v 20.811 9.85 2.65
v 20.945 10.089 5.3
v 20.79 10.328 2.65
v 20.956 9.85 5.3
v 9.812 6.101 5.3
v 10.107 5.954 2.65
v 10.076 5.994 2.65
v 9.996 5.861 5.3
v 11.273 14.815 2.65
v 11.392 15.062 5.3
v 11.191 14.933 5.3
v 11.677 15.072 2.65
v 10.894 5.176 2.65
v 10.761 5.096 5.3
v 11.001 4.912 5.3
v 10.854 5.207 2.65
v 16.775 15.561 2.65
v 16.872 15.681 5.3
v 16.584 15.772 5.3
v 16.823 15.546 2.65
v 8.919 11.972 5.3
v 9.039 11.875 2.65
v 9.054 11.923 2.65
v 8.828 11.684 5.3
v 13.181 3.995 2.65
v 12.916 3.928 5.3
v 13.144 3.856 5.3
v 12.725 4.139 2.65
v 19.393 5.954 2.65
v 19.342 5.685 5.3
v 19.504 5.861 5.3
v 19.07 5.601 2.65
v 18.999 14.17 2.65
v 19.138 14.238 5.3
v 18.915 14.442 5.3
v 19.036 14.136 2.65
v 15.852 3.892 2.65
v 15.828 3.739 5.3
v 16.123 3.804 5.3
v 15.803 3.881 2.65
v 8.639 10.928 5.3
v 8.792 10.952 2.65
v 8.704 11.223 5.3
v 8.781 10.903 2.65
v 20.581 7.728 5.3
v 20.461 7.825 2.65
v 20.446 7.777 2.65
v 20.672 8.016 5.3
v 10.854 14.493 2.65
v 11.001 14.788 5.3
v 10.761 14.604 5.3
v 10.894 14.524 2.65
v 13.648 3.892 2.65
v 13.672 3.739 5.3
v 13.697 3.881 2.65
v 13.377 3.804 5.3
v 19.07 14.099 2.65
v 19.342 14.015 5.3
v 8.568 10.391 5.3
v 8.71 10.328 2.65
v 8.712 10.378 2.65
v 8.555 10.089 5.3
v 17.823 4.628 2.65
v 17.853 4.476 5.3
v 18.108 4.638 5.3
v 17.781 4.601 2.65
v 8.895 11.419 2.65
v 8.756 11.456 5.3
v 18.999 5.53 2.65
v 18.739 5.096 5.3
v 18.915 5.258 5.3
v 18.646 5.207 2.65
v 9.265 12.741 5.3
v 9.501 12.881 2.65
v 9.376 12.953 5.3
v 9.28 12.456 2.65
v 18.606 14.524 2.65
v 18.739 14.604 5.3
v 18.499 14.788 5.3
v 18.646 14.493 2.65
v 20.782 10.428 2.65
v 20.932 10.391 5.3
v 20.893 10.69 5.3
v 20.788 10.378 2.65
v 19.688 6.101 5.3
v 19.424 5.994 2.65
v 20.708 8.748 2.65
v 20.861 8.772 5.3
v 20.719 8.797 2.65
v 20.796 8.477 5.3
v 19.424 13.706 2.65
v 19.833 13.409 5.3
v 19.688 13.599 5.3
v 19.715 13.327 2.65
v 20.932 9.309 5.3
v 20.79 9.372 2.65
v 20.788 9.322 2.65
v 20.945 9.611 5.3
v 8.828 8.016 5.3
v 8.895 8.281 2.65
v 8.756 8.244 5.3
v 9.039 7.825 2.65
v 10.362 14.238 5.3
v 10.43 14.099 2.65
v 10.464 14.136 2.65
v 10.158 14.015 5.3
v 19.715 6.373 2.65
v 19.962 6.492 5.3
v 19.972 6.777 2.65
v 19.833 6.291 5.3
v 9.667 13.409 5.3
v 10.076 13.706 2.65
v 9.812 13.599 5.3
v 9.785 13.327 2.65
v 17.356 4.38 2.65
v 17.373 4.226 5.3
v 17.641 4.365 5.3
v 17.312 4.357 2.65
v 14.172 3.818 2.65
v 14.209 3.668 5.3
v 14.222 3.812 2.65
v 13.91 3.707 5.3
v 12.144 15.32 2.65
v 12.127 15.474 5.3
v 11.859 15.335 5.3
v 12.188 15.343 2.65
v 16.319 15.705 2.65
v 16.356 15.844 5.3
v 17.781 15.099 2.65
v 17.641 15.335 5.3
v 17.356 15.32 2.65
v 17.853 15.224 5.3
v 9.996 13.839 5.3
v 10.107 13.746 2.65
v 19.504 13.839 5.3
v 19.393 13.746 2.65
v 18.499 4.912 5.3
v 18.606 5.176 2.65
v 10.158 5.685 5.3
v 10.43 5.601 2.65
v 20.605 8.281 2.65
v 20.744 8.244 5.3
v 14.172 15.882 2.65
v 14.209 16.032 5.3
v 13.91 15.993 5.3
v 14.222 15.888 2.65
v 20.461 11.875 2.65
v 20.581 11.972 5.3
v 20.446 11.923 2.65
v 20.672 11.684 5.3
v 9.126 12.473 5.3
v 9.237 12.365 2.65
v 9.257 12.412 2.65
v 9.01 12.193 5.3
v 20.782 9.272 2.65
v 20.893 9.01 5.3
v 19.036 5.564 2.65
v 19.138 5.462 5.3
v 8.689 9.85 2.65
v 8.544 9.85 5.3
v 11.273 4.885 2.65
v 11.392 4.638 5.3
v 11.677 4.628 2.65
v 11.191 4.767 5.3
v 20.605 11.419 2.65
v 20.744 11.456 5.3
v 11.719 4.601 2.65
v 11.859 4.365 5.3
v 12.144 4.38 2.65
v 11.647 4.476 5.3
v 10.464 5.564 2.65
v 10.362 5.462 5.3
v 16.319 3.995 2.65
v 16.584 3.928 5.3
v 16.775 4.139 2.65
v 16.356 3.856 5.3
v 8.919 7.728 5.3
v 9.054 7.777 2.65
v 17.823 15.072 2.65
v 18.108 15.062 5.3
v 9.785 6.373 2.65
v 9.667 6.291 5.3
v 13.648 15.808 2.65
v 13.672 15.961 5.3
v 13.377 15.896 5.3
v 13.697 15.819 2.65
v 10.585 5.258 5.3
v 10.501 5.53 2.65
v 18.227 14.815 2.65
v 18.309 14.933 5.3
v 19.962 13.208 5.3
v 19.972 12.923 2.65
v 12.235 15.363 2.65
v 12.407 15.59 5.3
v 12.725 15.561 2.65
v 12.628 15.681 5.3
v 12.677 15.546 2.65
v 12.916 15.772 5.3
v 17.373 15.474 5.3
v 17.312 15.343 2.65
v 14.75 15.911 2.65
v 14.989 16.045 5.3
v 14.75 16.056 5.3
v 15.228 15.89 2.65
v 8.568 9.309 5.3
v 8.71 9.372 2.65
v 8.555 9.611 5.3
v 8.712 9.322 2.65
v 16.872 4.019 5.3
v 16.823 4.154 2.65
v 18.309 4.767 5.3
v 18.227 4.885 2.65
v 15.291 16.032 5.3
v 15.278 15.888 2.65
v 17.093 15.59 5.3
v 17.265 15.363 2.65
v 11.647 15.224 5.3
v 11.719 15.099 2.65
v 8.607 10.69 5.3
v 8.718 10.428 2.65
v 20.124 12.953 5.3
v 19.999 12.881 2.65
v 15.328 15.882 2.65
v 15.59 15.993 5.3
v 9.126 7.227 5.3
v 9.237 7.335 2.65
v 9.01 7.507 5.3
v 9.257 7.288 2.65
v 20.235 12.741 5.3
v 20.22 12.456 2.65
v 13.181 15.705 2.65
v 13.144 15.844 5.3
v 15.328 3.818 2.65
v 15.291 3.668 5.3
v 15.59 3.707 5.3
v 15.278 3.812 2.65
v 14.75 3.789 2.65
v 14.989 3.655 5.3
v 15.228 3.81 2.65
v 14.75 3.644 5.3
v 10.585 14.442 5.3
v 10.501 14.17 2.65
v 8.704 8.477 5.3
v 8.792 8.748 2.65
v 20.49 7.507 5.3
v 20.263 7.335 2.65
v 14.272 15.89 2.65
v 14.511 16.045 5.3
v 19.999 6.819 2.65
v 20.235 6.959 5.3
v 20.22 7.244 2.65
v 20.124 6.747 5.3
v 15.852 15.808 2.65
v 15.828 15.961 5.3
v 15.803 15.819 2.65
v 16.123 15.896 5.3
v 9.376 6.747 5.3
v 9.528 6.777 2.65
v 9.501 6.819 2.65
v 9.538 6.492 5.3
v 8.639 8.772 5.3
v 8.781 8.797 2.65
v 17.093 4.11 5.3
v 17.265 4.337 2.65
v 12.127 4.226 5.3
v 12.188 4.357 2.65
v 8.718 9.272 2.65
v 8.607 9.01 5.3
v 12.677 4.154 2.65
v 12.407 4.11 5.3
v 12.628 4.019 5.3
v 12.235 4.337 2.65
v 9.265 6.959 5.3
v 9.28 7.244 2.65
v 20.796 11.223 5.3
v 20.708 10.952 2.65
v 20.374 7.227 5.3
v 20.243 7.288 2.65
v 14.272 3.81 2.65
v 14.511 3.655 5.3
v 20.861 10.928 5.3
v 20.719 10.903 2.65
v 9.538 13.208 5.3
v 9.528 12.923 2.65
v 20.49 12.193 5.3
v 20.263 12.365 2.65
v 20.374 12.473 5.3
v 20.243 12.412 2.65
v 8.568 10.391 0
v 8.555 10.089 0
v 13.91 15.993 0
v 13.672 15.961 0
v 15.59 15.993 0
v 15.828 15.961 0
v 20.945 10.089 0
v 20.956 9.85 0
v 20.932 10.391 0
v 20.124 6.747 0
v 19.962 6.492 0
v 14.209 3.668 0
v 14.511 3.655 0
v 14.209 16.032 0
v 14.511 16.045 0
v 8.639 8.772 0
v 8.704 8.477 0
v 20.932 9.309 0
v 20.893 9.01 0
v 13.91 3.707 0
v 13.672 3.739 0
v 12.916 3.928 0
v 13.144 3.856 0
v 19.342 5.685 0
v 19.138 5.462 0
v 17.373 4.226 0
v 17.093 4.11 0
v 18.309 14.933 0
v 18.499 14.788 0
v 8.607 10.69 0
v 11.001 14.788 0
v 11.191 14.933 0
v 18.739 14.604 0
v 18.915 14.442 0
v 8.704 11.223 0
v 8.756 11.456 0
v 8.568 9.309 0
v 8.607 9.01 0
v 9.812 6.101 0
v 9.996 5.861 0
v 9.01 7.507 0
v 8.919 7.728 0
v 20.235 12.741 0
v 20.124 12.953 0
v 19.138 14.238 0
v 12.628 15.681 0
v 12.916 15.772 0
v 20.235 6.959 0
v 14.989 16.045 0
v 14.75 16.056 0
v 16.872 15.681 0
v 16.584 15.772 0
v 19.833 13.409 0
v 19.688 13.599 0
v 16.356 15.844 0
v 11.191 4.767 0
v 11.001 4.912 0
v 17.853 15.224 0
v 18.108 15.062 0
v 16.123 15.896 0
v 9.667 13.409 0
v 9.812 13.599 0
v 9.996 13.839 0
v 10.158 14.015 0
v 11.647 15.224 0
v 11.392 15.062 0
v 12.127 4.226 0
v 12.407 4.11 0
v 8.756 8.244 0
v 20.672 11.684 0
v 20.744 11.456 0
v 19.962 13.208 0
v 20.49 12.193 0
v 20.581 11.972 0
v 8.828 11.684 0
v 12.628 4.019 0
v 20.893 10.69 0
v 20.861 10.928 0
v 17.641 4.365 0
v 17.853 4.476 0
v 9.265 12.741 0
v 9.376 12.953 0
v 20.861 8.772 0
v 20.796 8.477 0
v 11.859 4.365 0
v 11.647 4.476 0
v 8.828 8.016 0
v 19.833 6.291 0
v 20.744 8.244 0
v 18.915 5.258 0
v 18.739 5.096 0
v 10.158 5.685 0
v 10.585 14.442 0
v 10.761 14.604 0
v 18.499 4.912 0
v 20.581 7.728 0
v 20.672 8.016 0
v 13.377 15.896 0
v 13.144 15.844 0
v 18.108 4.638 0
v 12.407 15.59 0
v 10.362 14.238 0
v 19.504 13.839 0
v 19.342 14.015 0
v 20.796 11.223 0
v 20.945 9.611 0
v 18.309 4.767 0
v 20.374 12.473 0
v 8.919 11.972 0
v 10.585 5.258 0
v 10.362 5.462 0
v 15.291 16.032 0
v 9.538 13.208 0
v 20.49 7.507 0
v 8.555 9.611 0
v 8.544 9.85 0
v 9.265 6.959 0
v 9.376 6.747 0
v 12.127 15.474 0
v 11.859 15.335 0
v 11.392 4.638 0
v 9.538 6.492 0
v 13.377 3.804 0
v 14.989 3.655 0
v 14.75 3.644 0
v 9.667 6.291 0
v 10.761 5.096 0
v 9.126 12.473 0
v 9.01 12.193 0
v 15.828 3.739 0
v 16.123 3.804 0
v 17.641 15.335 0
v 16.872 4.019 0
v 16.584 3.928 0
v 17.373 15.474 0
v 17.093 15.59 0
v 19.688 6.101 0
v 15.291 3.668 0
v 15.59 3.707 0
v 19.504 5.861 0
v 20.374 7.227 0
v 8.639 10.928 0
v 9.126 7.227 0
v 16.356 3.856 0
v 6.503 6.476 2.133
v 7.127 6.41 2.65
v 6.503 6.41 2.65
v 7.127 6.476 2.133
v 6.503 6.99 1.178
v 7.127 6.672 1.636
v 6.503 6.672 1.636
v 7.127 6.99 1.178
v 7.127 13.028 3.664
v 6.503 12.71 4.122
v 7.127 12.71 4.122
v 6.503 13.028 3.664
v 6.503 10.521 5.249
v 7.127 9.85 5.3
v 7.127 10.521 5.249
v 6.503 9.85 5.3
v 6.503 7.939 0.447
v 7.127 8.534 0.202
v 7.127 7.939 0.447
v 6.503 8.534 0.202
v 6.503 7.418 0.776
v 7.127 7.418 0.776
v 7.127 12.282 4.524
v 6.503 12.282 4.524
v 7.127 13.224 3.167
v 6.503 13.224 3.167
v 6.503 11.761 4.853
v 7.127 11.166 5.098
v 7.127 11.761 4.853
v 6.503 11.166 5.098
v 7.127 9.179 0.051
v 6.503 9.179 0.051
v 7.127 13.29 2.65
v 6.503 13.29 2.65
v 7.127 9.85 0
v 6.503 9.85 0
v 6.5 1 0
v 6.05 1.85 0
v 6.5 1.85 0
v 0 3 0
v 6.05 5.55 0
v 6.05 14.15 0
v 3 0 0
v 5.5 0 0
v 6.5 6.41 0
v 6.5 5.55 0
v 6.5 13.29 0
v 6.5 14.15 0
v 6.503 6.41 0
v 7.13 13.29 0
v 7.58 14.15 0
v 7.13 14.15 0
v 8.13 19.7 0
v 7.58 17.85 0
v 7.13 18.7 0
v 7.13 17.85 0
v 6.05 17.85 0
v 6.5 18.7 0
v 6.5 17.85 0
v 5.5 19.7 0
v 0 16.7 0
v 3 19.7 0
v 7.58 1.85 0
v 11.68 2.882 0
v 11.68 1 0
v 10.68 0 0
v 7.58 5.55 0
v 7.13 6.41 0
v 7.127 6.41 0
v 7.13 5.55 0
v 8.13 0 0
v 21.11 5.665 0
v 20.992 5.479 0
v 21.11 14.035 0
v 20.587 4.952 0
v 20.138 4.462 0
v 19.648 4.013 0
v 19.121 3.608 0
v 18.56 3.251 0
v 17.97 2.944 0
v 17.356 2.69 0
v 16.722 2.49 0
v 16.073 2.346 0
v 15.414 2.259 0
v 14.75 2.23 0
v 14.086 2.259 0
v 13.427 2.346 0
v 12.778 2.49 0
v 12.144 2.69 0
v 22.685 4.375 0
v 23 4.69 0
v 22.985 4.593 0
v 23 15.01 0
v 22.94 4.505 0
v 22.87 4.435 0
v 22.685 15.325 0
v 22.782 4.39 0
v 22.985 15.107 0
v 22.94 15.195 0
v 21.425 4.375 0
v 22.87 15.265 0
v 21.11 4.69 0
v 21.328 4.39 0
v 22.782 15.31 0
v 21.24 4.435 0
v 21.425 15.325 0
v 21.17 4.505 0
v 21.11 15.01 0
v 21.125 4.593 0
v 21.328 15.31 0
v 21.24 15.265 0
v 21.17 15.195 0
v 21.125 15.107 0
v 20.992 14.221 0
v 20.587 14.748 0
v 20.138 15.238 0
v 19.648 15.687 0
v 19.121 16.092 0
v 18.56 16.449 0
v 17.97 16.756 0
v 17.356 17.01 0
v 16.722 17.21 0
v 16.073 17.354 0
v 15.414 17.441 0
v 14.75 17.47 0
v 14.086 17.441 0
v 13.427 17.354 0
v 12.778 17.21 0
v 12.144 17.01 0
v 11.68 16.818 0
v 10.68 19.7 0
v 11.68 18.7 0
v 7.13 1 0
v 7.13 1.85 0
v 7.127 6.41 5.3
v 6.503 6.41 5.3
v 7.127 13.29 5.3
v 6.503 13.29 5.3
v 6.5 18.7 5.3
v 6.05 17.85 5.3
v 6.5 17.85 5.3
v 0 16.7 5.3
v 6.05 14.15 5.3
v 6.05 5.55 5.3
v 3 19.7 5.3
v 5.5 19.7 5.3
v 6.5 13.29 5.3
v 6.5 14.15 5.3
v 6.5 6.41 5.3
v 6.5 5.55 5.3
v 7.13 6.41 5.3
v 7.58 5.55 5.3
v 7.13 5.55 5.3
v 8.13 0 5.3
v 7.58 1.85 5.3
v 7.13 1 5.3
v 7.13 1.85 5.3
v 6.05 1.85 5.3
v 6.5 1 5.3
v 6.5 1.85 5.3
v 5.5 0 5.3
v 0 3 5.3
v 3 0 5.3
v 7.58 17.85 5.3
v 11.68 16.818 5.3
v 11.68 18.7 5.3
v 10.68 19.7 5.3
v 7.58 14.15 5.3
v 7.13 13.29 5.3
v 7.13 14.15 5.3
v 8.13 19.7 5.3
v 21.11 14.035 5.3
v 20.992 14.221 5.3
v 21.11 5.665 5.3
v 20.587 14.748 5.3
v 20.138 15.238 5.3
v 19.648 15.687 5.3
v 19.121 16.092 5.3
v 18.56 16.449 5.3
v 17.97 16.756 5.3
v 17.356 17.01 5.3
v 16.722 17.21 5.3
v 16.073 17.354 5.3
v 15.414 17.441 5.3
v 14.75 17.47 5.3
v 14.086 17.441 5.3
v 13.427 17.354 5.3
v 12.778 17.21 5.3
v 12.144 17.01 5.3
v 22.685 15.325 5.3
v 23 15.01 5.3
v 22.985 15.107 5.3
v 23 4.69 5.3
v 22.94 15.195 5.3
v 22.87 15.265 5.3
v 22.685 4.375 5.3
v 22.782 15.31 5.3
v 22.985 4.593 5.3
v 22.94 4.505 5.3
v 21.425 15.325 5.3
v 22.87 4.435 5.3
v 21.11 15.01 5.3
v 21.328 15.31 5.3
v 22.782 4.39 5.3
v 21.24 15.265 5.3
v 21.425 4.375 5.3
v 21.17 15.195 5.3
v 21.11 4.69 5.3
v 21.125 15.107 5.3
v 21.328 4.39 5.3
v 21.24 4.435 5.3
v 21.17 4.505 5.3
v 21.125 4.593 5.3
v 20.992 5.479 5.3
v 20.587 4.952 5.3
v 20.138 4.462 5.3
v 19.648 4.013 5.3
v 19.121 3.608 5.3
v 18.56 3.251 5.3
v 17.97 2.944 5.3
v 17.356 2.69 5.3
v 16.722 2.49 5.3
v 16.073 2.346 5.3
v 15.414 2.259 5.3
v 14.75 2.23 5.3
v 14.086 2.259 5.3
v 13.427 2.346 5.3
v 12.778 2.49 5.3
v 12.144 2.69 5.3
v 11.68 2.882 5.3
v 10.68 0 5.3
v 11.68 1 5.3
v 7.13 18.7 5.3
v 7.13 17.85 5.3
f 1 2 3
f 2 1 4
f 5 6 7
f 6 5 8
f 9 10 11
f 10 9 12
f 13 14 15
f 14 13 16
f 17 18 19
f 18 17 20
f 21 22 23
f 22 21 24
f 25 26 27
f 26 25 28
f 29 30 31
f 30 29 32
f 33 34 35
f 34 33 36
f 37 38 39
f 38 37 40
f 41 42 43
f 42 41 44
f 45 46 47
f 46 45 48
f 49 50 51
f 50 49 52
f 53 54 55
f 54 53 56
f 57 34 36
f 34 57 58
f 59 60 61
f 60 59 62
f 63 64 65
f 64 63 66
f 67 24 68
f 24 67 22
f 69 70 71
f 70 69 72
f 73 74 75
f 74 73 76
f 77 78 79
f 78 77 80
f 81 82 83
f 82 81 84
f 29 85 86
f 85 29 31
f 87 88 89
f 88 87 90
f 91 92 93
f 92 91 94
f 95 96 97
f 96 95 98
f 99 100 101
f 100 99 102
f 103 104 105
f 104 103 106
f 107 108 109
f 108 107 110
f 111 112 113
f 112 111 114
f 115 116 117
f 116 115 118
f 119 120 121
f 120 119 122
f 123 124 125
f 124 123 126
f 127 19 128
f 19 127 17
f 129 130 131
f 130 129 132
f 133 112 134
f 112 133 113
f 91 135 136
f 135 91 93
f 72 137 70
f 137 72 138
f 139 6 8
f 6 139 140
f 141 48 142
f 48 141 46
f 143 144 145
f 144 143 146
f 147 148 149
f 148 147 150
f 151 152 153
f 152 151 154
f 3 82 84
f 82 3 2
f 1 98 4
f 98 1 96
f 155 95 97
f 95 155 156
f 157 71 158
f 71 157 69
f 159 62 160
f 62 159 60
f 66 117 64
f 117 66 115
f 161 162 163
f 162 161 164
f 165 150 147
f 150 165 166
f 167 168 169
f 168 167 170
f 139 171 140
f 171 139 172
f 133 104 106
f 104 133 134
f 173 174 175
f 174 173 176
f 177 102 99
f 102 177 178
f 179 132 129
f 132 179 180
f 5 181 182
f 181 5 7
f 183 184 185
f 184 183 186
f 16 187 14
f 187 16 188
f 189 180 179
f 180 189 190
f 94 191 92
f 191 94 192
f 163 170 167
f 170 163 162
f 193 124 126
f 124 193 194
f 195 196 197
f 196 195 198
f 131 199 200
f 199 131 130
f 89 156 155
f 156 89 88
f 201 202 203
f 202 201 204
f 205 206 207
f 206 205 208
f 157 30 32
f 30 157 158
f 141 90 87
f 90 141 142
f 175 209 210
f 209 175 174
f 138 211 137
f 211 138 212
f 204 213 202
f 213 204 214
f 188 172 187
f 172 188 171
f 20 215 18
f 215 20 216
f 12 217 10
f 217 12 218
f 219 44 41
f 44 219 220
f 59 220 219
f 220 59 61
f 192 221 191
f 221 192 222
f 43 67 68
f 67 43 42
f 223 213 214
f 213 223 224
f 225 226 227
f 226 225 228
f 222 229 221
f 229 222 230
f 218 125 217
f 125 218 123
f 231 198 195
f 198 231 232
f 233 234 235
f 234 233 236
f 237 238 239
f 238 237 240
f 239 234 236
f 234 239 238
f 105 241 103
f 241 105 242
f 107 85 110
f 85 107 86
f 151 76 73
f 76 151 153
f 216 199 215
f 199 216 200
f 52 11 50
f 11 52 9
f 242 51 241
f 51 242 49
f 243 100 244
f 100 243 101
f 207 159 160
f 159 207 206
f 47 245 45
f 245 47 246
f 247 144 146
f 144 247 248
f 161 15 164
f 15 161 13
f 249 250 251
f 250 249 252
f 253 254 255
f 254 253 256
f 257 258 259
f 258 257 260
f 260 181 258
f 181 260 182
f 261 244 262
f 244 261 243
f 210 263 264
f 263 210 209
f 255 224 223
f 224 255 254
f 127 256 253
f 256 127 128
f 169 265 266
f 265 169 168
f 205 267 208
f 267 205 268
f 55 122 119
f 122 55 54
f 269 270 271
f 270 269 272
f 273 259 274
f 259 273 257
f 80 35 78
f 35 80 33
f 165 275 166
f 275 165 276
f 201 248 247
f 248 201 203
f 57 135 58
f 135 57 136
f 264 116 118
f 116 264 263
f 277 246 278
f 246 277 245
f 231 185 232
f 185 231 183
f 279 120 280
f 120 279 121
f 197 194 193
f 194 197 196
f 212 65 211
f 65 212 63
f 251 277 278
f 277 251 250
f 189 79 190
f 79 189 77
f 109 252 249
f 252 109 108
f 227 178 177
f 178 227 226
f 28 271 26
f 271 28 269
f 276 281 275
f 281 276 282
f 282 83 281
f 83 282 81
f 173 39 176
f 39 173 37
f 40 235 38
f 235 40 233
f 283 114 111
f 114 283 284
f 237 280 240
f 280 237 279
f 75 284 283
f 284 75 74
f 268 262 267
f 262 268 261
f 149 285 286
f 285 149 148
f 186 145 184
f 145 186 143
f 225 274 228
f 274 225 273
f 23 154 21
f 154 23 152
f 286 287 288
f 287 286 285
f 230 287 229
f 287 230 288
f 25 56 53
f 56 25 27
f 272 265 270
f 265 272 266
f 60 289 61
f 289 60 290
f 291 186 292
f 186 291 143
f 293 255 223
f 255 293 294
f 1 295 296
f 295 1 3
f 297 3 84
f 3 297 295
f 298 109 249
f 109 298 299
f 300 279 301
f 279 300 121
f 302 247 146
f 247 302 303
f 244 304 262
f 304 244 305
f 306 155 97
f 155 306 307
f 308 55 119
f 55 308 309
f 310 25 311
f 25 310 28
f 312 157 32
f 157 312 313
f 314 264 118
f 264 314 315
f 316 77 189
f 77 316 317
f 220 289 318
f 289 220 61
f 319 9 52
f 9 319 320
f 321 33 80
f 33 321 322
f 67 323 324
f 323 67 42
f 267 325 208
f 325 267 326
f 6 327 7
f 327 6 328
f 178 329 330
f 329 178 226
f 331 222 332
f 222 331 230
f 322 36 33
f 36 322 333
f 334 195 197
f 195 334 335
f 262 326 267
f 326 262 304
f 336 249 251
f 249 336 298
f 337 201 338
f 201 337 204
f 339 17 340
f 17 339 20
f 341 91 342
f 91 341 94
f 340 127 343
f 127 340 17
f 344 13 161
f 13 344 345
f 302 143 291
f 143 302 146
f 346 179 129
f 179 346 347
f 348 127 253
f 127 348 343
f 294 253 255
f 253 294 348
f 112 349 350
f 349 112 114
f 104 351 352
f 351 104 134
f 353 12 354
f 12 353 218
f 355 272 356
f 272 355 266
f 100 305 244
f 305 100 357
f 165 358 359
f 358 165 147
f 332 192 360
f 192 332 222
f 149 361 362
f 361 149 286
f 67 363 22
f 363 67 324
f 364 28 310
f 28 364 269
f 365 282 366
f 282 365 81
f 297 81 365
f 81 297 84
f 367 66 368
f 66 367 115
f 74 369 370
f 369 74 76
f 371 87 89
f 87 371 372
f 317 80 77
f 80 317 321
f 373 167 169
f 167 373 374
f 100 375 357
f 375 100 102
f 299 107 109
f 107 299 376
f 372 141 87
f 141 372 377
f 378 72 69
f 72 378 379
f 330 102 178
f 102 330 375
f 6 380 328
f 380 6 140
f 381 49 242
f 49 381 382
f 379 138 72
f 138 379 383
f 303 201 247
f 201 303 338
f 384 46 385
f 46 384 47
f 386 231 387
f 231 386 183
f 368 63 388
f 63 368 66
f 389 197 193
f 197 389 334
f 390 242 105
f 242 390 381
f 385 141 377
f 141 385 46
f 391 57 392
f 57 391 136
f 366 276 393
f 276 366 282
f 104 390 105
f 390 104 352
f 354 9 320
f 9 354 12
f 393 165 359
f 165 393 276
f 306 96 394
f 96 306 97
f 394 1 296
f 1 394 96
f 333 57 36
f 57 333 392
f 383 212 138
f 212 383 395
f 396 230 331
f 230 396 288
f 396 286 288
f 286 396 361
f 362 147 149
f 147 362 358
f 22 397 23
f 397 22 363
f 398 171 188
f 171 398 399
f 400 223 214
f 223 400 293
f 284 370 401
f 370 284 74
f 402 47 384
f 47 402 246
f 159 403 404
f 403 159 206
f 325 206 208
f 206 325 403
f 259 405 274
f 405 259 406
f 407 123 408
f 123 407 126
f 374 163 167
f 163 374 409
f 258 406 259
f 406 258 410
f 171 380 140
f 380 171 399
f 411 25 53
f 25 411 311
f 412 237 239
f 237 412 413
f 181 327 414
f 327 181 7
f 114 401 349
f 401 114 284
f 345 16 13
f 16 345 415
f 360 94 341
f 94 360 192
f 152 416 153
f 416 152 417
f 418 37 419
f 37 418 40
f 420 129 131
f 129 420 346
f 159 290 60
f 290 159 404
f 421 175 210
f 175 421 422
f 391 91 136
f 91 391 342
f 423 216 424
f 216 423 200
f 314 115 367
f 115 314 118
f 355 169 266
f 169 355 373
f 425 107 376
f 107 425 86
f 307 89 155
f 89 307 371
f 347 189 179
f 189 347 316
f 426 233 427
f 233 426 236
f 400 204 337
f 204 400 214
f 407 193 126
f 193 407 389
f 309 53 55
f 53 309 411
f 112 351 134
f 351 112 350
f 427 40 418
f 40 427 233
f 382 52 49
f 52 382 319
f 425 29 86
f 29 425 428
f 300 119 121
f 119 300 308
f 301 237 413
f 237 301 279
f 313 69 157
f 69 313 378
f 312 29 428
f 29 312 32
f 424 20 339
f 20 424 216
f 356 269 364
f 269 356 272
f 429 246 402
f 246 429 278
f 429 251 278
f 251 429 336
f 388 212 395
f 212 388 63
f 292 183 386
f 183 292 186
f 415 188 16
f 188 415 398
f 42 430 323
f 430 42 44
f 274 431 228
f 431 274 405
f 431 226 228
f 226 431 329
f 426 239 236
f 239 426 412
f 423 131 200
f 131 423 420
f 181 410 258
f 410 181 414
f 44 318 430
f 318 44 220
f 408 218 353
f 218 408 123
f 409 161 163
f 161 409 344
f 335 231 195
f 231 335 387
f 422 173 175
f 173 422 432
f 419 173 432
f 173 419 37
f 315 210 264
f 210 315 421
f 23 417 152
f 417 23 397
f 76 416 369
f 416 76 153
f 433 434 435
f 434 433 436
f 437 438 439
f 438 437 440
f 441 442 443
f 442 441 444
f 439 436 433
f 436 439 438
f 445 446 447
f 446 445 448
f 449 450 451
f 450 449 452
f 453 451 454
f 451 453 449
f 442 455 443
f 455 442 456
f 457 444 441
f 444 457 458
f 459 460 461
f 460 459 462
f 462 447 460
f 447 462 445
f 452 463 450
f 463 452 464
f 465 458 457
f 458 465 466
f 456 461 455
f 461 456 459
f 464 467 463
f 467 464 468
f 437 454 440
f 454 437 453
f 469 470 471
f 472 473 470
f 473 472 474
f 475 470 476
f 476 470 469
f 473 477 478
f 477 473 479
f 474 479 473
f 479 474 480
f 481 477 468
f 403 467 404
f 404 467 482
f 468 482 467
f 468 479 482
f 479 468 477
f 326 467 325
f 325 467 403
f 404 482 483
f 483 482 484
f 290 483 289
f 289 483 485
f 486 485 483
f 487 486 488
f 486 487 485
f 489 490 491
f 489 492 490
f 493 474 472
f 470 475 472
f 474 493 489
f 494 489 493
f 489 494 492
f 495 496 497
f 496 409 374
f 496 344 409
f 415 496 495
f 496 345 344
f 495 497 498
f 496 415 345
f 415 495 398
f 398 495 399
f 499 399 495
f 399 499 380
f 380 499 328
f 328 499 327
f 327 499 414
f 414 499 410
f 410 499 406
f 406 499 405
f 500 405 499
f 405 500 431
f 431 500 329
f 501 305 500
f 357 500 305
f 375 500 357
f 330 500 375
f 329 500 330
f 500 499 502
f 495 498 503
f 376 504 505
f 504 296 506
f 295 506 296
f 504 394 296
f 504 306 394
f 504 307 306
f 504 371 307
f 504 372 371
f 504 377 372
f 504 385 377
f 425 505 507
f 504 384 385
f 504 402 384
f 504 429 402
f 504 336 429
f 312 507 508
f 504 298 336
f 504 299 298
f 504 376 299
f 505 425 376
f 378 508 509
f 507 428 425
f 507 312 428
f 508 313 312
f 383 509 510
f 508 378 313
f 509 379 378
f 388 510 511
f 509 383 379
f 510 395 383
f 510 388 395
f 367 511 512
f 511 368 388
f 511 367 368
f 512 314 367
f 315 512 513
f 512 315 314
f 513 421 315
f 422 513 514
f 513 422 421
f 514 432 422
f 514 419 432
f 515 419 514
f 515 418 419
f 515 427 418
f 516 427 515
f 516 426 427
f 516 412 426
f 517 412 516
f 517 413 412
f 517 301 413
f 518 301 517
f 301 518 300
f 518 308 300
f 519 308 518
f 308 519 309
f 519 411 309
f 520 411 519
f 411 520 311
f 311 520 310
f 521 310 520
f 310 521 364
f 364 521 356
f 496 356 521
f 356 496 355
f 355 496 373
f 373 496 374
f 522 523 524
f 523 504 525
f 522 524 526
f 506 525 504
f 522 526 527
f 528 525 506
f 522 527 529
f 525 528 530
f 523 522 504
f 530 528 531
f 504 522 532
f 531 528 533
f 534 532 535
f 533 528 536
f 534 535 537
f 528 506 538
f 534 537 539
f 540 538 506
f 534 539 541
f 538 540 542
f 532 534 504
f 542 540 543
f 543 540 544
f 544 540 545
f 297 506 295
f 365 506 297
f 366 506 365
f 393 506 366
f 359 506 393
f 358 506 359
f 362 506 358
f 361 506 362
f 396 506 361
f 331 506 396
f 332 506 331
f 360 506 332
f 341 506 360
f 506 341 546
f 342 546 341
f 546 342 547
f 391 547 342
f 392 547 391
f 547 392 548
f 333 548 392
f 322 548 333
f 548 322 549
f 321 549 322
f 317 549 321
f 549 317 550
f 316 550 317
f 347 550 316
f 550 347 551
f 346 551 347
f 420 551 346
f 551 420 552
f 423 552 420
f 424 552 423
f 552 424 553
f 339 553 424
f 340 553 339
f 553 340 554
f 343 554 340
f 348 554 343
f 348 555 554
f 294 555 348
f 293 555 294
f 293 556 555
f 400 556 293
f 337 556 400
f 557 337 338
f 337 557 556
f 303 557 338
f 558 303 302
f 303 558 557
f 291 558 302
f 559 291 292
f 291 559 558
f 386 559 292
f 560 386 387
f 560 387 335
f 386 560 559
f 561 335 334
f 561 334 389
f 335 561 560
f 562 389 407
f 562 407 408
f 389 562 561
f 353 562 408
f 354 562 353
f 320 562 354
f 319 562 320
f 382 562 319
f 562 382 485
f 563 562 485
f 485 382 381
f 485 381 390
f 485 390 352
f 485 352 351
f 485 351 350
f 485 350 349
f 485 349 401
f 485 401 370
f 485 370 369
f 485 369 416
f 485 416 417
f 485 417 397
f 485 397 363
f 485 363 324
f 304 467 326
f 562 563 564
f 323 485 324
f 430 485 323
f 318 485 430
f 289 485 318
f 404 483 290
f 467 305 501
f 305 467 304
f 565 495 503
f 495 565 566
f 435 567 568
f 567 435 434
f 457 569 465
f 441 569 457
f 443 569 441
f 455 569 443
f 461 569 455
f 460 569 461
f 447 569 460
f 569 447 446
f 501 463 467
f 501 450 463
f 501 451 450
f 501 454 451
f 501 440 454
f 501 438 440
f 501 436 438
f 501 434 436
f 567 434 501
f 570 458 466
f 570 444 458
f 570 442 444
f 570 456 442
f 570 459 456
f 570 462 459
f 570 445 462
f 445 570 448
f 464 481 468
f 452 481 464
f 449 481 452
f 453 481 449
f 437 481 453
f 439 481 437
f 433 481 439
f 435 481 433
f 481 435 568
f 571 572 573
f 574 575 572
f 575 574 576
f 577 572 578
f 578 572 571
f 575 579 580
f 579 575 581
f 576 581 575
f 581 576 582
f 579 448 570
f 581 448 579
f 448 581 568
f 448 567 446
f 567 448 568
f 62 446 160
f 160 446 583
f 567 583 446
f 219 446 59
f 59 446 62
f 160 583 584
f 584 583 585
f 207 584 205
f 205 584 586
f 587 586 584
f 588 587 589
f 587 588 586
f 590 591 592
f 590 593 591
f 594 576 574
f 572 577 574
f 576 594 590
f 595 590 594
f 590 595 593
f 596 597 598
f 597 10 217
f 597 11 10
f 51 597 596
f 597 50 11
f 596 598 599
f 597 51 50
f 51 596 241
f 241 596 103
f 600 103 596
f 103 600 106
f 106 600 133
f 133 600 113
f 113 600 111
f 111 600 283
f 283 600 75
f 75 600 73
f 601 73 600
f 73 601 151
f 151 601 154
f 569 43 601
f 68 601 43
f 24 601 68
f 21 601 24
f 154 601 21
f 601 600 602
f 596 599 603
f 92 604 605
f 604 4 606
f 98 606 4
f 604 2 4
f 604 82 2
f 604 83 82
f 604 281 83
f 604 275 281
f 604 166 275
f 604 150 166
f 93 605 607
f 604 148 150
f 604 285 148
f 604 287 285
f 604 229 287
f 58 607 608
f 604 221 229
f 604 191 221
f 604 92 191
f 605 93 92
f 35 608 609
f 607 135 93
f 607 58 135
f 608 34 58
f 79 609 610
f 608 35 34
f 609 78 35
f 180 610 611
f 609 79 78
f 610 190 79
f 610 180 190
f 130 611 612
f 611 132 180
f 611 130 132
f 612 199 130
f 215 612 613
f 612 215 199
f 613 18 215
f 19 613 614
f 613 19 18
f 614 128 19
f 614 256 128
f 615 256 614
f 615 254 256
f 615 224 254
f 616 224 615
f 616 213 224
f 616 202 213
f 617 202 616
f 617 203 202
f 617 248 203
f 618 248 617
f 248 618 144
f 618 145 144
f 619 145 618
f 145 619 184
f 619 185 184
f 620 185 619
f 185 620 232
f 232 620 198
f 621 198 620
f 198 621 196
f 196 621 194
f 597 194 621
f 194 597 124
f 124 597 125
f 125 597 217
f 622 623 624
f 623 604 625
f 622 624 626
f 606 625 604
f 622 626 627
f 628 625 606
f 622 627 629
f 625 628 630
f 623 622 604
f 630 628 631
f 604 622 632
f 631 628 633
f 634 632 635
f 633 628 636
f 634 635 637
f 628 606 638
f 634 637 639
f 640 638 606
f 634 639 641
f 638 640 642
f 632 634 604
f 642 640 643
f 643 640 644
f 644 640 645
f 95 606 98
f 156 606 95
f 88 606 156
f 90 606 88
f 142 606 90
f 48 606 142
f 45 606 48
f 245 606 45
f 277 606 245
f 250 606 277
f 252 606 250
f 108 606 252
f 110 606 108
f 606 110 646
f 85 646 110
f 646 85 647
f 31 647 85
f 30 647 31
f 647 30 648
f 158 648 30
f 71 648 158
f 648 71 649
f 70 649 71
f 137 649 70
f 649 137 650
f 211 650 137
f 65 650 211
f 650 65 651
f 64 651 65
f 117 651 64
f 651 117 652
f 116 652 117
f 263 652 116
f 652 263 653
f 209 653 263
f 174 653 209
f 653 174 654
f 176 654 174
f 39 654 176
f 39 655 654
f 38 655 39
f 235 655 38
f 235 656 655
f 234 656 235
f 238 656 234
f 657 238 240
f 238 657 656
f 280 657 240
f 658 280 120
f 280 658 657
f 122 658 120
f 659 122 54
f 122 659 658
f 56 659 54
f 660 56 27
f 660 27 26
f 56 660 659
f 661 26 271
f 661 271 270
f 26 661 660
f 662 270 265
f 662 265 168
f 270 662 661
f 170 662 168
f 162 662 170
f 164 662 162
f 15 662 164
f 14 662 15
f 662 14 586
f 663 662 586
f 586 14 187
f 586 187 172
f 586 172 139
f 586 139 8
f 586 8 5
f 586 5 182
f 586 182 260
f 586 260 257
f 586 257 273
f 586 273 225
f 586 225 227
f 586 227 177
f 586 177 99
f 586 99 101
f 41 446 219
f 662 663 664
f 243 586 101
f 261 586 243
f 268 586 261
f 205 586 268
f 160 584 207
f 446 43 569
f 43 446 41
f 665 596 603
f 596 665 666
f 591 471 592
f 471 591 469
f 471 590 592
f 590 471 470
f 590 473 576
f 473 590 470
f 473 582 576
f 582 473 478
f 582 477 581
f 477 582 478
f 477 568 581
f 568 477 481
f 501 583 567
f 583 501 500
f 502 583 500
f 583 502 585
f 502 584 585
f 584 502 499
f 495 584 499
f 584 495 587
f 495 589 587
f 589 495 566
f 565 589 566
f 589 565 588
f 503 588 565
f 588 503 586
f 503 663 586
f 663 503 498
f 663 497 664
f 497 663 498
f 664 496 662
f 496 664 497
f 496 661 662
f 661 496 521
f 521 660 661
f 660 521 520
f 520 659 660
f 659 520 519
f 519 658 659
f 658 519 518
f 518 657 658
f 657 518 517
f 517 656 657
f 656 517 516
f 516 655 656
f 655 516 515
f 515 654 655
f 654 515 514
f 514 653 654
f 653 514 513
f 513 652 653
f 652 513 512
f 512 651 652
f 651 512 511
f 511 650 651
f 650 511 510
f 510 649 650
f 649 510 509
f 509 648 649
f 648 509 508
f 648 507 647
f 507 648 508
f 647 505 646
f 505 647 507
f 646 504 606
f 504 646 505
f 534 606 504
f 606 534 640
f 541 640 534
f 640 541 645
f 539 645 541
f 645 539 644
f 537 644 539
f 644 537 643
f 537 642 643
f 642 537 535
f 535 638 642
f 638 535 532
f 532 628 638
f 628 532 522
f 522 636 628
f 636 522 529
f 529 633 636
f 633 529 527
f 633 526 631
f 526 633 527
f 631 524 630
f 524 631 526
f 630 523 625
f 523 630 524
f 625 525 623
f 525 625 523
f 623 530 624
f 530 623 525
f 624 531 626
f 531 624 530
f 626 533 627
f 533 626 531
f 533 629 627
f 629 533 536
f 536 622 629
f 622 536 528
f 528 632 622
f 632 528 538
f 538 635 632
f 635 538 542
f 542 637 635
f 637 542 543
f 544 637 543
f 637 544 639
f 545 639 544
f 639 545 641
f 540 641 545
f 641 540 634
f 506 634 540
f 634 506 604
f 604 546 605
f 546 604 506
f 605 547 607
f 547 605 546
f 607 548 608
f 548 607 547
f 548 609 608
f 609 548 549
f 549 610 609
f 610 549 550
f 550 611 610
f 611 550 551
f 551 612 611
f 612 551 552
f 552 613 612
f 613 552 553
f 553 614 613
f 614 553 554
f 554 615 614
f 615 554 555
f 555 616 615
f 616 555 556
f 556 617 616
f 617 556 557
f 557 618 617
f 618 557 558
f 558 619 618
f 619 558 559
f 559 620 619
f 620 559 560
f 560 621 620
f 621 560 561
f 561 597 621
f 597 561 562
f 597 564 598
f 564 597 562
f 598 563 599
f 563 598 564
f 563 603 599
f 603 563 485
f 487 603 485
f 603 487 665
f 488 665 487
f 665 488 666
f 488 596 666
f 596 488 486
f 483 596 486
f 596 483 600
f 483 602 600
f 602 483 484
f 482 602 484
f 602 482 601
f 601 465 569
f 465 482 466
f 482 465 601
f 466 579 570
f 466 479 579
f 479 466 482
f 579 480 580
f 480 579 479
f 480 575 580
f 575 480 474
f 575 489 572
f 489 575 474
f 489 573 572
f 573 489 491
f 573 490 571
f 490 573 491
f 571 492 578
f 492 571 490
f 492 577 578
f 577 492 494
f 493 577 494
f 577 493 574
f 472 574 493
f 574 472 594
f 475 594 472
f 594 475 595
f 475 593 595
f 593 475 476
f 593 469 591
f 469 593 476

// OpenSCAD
$fa = 5;
$fs = 0.1;

// Cetus rail
rail_width    = 3.7;
rail_length   = 15.9;
rail_thikness = 0.9;
rail_height   = 7.4 - rail_thikness;
rail_distance = 8.6;
rail_back_distance = 7.3;

// Bat
bat_diameter = 12.7;
bat_height = 36;

// Champher is doubled for the angles right under the copter's belly
clamp_champher = 1;

module bat_cutter(d, h) {
  narrow = 0.95 * d;
  length = h * 1.1;
  // I keep internal of the righ a bit tighter, as batt has variable ø
  // Basically to cut cones, connected with narrower parts
  union() {
    translate([0,0,h - length])
      color("#0000cd") cylinder(h=length, d1=narrow, d2=d);
    translate([0,0, - h])
      color("#7fff00")cylinder(h=length, d2=narrow, d1=d);
  }
}

// Cutter should have an impeller-like shape
module neck_cutter(neck_width, neck_height, slit) {
  diameter = neck_height < neck_width ? neck_height : neck_width;
  difference() {
    translate([0, 0, slit/2])
      cube([neck_height * 1.1, neck_width * 1.1, slit * 0.99], center=true);
    resize([neck_height, neck_width]) {
      // I want to have a cutter form and then stretch it to the
      // real neck
      param = 1;
      union() {
        translate([0, (param - param) / 2])
          color("#Ff6347") cylinder(d=param,h=slit);
        translate([0, - (param - param) / 2])
          color("#Ffebcd") cylinder(d=param,h=slit);
        translate([0, 0, slit / 2])
          cube([param, (param - param), slit], center=true);
        translate([param / 4, param / 4, slit / 2])
          cube([param / 2, param / 2, slit], center=true);
        translate([- param / 4, - param / 4, slit / 2])
          cube([param / 2, param / 2, slit], center=true);
      }
    }
  }
}

module clamp_profile(w, l, keyhole_depth, h, d, champher, b_d, b_h) {
  // The following digits are not supposed to be an external parameters
  // Once you pick the optimal value, it won't be changed
  // -----
  // neck_width - the connector between clips, up from the bat
  // flap_length - the part from the keyhole to the end of the clip
  // length - overall part length
  // slit - the clearense of the clamps
  // t - depth of the keyhole on the jaw (2 * t + slit >> keyhole_depth)
  // -----
  neck_width = d * 0.8;
  flap_length = w / 2;
  length = 2 * w + 2 * flap_length + d;
  slit = keyhole_depth * 0.7;
  t = keyhole_depth / 2;
  echo("Total calculated length: ", length);

  b_t = h * 0.7; // thikness of bat side of the clamp
  bat_outer_diam = b_d * 1.2;
  bat_center_y = (flap_length + w) + d / 2 ;
  bat_center_x = h + slit + bat_outer_diam / 2;

  difference() {
    linear_extrude(l) {
      union() {
      polygon(points=[
                      // (0,0)
                      [0, 3 * champher],
                      [0, length - 3 * champher],

                      [3 * champher , length],
                      [h - champher, length],
                      [h, length - champher],

                      // ----- Jaw (further from 0)
                      // Top jaw
                      [h, length - flap_length],
                      [h - t, length - flap_length],
                      [h - t, length - (flap_length + w)],
                      [h, length - (flap_length + w)],

                      // Neck
                      [h, bat_center_y + neck_width / 2],
                      [h + slit, bat_center_y + neck_width / 2],

                      // Lower jaw
                      [h + slit, length - (flap_length + w)],
                      [h + slit + t, length - (flap_length + w)],
                      [h + slit + t, length - flap_length],
                      [h + slit, length - flap_length],

                      [h + slit, length - champher],
                      [h + slit + champher, length],
                      [h + b_t + slit - champher, length],
                      [h + b_t + slit, length - champher],

                      [h + b_t + slit, champher],
                      // ----- Jaw (closer to 0)
                      [h + b_t + slit - champher, 0],

                      [h + slit + champher, 0],
                      [h + slit, champher],

                      [h + slit , length - (flap_length + 2 * w) - d],
                      [h + slit + t, length - (flap_length + 2 * w) - d],
                      [h + slit + t, length - (flap_length + w) - d],
                      [h + slit , length - (flap_length + w) - d],

                      [h + slit, bat_center_y - neck_width / 2],
                      [h, bat_center_y - neck_width / 2],

                      [h, length - (flap_length + w) - d],
                      [h - t, length - (flap_length + w) - d],
                      [h - t, length - (flap_length + 2 * w) - d],
                      [h, length - (flap_length + 2 * w) - d],

                      [h, champher],
                      [h - champher, 0],

                      [3 * champher, 0]
                      ]);
      translate([bat_center_x, bat_center_y])
        // Bat holding circle with flat stand
        union() {
          color("#F08080") circle(d = bat_outer_diam);
          translate([(bat_outer_diam - slit) / 2, 0])
            minkowski() {
              square([slit * 2 , neck_width * 1.5], center=true);
              circle(d=slit);
            }
        }
      }
    }
    translate([bat_center_x, bat_center_y, l/2])
      bat_cutter(b_d, l);
    translate([h, bat_center_y, l / 2])
      rotate([0, 90, 0])
        neck_cutter(neck_width, l, slit);
  }
}


clamp_profile(rail_width,
              rail_length / 3,
              rail_thikness,
              rail_height,
              rail_distance,
              clamp_champher,
              bat_diameter,
              bat_height);
